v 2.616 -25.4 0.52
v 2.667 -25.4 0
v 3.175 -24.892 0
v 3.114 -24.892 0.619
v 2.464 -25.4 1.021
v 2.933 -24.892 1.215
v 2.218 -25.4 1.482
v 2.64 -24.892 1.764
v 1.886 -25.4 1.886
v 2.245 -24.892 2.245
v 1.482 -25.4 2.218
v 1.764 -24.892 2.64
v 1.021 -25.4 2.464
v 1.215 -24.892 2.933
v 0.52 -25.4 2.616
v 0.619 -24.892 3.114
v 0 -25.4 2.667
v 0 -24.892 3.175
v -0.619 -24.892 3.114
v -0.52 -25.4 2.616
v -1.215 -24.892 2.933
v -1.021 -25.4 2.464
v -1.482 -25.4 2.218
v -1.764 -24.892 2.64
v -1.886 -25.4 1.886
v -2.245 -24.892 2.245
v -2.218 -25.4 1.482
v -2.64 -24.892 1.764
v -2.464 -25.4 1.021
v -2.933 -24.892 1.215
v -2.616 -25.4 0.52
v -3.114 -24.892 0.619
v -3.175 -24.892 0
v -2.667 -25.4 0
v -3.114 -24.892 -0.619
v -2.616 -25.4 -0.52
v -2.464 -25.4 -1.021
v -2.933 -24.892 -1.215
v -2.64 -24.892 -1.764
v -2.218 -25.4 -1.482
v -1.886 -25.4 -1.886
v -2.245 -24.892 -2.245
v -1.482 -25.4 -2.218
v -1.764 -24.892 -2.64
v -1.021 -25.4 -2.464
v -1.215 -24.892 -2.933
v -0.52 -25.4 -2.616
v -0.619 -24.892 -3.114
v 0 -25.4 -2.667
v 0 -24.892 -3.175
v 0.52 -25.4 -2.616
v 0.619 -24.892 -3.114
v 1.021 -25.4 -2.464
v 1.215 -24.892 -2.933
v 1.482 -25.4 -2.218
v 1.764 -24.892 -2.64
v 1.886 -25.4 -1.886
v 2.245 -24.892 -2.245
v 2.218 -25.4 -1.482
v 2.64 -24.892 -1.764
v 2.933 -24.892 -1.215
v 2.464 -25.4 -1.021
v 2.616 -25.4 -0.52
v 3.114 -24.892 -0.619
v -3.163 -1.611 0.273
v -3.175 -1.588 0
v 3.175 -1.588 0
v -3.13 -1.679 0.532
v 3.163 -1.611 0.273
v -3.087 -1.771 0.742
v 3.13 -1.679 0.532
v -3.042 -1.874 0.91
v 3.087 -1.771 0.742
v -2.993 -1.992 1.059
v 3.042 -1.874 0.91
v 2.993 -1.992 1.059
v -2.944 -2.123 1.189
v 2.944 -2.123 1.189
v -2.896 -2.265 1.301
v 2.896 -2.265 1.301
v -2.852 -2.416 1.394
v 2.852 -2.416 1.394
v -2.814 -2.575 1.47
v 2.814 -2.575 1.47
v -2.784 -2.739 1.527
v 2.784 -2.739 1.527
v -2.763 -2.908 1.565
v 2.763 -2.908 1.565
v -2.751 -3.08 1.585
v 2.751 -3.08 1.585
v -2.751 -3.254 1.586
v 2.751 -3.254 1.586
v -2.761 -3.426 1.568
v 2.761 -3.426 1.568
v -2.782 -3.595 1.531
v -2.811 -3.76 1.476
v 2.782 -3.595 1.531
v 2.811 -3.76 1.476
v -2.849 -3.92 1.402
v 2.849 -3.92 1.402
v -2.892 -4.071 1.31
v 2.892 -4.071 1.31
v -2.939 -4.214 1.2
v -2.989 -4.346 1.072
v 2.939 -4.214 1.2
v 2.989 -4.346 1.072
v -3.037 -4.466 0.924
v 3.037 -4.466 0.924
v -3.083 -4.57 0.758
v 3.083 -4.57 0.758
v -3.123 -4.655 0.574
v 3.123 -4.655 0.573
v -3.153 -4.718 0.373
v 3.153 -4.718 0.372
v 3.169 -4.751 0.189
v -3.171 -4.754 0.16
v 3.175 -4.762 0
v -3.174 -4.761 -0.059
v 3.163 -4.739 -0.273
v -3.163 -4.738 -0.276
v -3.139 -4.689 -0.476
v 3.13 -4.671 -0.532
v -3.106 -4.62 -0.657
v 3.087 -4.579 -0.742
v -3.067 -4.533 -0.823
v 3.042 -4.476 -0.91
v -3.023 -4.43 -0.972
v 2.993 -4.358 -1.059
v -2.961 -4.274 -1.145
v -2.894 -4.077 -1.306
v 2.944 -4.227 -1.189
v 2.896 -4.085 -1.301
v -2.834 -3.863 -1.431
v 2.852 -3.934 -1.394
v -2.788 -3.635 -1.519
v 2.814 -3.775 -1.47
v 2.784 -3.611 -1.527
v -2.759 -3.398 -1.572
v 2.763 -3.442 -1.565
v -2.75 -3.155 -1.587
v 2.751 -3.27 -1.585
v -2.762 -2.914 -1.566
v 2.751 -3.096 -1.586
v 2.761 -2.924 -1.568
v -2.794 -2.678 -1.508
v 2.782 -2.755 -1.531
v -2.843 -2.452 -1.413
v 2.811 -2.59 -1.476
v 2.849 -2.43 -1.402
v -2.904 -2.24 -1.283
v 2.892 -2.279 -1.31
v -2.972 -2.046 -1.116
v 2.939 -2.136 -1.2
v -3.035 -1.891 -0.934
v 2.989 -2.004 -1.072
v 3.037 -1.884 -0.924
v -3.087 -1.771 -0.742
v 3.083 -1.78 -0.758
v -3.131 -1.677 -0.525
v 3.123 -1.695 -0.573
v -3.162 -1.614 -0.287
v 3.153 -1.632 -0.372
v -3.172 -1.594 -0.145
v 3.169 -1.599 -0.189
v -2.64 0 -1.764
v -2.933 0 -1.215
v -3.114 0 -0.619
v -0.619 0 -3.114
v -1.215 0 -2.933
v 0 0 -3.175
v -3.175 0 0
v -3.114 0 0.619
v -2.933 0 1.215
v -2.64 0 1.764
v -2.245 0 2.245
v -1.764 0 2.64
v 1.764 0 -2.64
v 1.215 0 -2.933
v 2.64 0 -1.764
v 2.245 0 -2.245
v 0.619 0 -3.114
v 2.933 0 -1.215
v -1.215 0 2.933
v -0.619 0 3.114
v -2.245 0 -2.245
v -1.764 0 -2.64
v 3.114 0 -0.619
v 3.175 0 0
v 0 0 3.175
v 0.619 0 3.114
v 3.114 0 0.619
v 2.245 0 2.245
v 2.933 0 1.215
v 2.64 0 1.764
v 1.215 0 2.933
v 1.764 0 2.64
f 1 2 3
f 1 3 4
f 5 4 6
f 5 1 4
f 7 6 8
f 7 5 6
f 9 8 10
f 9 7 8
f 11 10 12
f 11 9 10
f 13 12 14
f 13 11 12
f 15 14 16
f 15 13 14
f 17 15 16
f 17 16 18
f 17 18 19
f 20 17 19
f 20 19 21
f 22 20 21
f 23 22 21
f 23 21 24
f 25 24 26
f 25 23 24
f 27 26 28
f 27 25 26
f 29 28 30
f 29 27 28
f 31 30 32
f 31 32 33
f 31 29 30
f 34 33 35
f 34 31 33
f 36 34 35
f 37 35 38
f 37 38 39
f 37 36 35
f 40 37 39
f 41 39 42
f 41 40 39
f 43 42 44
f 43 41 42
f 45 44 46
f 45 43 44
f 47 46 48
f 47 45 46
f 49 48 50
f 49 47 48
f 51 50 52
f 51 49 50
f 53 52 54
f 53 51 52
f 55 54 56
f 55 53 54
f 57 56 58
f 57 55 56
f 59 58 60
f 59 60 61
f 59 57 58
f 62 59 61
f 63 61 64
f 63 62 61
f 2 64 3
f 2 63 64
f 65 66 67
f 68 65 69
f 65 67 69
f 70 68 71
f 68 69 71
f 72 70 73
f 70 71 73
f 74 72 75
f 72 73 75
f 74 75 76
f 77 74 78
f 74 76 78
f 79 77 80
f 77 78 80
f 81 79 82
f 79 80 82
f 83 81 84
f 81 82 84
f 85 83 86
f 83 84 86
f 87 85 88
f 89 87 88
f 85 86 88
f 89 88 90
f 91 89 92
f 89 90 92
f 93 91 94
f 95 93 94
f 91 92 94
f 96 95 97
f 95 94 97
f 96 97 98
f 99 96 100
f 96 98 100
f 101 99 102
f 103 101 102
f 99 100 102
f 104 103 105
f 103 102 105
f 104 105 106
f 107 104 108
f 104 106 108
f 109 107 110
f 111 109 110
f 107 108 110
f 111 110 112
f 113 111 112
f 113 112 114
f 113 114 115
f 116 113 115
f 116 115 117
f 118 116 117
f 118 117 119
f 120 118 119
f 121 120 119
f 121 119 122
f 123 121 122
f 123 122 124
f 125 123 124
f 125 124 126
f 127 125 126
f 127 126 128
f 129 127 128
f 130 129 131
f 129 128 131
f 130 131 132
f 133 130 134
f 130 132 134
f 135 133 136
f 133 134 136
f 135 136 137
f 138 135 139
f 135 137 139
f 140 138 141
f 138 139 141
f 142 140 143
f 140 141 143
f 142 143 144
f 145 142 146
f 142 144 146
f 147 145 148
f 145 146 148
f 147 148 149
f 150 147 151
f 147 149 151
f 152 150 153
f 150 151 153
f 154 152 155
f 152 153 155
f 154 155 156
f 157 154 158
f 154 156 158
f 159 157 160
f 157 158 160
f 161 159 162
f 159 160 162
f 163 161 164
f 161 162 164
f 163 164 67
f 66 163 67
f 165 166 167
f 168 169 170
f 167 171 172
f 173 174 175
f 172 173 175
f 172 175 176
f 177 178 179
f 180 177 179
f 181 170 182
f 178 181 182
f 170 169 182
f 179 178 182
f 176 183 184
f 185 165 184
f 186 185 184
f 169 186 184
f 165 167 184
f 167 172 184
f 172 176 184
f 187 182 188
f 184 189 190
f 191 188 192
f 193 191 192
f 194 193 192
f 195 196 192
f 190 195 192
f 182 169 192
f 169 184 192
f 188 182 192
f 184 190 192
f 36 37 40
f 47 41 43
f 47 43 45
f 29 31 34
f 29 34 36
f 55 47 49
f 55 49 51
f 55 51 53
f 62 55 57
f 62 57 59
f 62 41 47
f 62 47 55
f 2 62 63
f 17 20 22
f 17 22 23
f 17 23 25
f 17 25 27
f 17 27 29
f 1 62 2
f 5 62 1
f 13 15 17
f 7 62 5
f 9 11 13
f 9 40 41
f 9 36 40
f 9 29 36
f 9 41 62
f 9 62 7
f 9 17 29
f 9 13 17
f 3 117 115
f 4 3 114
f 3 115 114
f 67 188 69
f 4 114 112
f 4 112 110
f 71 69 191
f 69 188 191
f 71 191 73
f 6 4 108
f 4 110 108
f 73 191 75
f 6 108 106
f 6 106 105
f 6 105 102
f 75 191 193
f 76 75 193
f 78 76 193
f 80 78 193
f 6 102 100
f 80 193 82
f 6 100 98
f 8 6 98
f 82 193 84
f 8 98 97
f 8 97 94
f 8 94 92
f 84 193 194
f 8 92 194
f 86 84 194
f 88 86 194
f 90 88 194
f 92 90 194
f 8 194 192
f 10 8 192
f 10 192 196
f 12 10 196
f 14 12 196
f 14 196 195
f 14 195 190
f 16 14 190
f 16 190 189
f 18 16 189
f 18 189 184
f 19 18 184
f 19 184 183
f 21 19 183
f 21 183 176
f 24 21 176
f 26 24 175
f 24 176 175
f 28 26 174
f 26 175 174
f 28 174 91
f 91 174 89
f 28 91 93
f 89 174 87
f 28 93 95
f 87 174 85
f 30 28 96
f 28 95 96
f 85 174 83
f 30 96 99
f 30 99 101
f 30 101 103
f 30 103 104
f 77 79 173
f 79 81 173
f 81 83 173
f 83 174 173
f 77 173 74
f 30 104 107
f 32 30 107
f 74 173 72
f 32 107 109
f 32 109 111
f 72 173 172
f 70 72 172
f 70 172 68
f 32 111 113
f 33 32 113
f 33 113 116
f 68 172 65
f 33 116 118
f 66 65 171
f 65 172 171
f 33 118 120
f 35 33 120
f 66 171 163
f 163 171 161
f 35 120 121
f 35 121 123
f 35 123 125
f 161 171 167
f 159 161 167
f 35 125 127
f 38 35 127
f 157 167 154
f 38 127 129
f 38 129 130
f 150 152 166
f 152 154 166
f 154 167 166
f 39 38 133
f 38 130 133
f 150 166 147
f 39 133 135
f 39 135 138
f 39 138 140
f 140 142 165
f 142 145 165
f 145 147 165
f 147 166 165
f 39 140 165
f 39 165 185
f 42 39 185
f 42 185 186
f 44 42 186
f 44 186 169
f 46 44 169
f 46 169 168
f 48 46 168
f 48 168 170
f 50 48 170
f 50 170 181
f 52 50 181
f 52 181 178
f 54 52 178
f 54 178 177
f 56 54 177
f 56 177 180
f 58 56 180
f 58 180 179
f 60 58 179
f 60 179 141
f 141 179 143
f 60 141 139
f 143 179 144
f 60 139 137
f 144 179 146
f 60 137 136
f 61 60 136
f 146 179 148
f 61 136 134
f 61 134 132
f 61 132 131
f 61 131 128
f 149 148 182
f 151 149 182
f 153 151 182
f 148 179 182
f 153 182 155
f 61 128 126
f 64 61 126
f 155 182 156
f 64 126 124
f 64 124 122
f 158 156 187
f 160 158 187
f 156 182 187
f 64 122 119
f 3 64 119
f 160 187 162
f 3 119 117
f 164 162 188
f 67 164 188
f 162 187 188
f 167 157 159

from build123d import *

# Parameters (mm, degrees)
F0_R     = 3.175
F1_DEPTH = 25.4
F2_SIZE  = 0.508
F3_R     = 1.5875
F4_DEPTH = 3.175


with BuildPart() as f1:
    # F0 (on Front) → F1 (new body)
    with BuildSketch(Plane.XZ):
        Circle(F0_R)
    extrude(amount=F1_DEPTH)

    # F2
    f2_edges = [f1.edges().sort_by_distance(p)[0] for p in [
        (-3.175, -25.4, 0),
    ]]
    chamfer(f2_edges, length=F2_SIZE)

    # F3 (on Right) → F4 (cut, symmetric)
    with BuildSketch(Plane.YZ):
        with Locations((-3.175, 0)):
            Circle(F3_R)
    extrude(amount=F4_DEPTH, both=True, mode=Mode.SUBTRACT)


solid = f1.part
